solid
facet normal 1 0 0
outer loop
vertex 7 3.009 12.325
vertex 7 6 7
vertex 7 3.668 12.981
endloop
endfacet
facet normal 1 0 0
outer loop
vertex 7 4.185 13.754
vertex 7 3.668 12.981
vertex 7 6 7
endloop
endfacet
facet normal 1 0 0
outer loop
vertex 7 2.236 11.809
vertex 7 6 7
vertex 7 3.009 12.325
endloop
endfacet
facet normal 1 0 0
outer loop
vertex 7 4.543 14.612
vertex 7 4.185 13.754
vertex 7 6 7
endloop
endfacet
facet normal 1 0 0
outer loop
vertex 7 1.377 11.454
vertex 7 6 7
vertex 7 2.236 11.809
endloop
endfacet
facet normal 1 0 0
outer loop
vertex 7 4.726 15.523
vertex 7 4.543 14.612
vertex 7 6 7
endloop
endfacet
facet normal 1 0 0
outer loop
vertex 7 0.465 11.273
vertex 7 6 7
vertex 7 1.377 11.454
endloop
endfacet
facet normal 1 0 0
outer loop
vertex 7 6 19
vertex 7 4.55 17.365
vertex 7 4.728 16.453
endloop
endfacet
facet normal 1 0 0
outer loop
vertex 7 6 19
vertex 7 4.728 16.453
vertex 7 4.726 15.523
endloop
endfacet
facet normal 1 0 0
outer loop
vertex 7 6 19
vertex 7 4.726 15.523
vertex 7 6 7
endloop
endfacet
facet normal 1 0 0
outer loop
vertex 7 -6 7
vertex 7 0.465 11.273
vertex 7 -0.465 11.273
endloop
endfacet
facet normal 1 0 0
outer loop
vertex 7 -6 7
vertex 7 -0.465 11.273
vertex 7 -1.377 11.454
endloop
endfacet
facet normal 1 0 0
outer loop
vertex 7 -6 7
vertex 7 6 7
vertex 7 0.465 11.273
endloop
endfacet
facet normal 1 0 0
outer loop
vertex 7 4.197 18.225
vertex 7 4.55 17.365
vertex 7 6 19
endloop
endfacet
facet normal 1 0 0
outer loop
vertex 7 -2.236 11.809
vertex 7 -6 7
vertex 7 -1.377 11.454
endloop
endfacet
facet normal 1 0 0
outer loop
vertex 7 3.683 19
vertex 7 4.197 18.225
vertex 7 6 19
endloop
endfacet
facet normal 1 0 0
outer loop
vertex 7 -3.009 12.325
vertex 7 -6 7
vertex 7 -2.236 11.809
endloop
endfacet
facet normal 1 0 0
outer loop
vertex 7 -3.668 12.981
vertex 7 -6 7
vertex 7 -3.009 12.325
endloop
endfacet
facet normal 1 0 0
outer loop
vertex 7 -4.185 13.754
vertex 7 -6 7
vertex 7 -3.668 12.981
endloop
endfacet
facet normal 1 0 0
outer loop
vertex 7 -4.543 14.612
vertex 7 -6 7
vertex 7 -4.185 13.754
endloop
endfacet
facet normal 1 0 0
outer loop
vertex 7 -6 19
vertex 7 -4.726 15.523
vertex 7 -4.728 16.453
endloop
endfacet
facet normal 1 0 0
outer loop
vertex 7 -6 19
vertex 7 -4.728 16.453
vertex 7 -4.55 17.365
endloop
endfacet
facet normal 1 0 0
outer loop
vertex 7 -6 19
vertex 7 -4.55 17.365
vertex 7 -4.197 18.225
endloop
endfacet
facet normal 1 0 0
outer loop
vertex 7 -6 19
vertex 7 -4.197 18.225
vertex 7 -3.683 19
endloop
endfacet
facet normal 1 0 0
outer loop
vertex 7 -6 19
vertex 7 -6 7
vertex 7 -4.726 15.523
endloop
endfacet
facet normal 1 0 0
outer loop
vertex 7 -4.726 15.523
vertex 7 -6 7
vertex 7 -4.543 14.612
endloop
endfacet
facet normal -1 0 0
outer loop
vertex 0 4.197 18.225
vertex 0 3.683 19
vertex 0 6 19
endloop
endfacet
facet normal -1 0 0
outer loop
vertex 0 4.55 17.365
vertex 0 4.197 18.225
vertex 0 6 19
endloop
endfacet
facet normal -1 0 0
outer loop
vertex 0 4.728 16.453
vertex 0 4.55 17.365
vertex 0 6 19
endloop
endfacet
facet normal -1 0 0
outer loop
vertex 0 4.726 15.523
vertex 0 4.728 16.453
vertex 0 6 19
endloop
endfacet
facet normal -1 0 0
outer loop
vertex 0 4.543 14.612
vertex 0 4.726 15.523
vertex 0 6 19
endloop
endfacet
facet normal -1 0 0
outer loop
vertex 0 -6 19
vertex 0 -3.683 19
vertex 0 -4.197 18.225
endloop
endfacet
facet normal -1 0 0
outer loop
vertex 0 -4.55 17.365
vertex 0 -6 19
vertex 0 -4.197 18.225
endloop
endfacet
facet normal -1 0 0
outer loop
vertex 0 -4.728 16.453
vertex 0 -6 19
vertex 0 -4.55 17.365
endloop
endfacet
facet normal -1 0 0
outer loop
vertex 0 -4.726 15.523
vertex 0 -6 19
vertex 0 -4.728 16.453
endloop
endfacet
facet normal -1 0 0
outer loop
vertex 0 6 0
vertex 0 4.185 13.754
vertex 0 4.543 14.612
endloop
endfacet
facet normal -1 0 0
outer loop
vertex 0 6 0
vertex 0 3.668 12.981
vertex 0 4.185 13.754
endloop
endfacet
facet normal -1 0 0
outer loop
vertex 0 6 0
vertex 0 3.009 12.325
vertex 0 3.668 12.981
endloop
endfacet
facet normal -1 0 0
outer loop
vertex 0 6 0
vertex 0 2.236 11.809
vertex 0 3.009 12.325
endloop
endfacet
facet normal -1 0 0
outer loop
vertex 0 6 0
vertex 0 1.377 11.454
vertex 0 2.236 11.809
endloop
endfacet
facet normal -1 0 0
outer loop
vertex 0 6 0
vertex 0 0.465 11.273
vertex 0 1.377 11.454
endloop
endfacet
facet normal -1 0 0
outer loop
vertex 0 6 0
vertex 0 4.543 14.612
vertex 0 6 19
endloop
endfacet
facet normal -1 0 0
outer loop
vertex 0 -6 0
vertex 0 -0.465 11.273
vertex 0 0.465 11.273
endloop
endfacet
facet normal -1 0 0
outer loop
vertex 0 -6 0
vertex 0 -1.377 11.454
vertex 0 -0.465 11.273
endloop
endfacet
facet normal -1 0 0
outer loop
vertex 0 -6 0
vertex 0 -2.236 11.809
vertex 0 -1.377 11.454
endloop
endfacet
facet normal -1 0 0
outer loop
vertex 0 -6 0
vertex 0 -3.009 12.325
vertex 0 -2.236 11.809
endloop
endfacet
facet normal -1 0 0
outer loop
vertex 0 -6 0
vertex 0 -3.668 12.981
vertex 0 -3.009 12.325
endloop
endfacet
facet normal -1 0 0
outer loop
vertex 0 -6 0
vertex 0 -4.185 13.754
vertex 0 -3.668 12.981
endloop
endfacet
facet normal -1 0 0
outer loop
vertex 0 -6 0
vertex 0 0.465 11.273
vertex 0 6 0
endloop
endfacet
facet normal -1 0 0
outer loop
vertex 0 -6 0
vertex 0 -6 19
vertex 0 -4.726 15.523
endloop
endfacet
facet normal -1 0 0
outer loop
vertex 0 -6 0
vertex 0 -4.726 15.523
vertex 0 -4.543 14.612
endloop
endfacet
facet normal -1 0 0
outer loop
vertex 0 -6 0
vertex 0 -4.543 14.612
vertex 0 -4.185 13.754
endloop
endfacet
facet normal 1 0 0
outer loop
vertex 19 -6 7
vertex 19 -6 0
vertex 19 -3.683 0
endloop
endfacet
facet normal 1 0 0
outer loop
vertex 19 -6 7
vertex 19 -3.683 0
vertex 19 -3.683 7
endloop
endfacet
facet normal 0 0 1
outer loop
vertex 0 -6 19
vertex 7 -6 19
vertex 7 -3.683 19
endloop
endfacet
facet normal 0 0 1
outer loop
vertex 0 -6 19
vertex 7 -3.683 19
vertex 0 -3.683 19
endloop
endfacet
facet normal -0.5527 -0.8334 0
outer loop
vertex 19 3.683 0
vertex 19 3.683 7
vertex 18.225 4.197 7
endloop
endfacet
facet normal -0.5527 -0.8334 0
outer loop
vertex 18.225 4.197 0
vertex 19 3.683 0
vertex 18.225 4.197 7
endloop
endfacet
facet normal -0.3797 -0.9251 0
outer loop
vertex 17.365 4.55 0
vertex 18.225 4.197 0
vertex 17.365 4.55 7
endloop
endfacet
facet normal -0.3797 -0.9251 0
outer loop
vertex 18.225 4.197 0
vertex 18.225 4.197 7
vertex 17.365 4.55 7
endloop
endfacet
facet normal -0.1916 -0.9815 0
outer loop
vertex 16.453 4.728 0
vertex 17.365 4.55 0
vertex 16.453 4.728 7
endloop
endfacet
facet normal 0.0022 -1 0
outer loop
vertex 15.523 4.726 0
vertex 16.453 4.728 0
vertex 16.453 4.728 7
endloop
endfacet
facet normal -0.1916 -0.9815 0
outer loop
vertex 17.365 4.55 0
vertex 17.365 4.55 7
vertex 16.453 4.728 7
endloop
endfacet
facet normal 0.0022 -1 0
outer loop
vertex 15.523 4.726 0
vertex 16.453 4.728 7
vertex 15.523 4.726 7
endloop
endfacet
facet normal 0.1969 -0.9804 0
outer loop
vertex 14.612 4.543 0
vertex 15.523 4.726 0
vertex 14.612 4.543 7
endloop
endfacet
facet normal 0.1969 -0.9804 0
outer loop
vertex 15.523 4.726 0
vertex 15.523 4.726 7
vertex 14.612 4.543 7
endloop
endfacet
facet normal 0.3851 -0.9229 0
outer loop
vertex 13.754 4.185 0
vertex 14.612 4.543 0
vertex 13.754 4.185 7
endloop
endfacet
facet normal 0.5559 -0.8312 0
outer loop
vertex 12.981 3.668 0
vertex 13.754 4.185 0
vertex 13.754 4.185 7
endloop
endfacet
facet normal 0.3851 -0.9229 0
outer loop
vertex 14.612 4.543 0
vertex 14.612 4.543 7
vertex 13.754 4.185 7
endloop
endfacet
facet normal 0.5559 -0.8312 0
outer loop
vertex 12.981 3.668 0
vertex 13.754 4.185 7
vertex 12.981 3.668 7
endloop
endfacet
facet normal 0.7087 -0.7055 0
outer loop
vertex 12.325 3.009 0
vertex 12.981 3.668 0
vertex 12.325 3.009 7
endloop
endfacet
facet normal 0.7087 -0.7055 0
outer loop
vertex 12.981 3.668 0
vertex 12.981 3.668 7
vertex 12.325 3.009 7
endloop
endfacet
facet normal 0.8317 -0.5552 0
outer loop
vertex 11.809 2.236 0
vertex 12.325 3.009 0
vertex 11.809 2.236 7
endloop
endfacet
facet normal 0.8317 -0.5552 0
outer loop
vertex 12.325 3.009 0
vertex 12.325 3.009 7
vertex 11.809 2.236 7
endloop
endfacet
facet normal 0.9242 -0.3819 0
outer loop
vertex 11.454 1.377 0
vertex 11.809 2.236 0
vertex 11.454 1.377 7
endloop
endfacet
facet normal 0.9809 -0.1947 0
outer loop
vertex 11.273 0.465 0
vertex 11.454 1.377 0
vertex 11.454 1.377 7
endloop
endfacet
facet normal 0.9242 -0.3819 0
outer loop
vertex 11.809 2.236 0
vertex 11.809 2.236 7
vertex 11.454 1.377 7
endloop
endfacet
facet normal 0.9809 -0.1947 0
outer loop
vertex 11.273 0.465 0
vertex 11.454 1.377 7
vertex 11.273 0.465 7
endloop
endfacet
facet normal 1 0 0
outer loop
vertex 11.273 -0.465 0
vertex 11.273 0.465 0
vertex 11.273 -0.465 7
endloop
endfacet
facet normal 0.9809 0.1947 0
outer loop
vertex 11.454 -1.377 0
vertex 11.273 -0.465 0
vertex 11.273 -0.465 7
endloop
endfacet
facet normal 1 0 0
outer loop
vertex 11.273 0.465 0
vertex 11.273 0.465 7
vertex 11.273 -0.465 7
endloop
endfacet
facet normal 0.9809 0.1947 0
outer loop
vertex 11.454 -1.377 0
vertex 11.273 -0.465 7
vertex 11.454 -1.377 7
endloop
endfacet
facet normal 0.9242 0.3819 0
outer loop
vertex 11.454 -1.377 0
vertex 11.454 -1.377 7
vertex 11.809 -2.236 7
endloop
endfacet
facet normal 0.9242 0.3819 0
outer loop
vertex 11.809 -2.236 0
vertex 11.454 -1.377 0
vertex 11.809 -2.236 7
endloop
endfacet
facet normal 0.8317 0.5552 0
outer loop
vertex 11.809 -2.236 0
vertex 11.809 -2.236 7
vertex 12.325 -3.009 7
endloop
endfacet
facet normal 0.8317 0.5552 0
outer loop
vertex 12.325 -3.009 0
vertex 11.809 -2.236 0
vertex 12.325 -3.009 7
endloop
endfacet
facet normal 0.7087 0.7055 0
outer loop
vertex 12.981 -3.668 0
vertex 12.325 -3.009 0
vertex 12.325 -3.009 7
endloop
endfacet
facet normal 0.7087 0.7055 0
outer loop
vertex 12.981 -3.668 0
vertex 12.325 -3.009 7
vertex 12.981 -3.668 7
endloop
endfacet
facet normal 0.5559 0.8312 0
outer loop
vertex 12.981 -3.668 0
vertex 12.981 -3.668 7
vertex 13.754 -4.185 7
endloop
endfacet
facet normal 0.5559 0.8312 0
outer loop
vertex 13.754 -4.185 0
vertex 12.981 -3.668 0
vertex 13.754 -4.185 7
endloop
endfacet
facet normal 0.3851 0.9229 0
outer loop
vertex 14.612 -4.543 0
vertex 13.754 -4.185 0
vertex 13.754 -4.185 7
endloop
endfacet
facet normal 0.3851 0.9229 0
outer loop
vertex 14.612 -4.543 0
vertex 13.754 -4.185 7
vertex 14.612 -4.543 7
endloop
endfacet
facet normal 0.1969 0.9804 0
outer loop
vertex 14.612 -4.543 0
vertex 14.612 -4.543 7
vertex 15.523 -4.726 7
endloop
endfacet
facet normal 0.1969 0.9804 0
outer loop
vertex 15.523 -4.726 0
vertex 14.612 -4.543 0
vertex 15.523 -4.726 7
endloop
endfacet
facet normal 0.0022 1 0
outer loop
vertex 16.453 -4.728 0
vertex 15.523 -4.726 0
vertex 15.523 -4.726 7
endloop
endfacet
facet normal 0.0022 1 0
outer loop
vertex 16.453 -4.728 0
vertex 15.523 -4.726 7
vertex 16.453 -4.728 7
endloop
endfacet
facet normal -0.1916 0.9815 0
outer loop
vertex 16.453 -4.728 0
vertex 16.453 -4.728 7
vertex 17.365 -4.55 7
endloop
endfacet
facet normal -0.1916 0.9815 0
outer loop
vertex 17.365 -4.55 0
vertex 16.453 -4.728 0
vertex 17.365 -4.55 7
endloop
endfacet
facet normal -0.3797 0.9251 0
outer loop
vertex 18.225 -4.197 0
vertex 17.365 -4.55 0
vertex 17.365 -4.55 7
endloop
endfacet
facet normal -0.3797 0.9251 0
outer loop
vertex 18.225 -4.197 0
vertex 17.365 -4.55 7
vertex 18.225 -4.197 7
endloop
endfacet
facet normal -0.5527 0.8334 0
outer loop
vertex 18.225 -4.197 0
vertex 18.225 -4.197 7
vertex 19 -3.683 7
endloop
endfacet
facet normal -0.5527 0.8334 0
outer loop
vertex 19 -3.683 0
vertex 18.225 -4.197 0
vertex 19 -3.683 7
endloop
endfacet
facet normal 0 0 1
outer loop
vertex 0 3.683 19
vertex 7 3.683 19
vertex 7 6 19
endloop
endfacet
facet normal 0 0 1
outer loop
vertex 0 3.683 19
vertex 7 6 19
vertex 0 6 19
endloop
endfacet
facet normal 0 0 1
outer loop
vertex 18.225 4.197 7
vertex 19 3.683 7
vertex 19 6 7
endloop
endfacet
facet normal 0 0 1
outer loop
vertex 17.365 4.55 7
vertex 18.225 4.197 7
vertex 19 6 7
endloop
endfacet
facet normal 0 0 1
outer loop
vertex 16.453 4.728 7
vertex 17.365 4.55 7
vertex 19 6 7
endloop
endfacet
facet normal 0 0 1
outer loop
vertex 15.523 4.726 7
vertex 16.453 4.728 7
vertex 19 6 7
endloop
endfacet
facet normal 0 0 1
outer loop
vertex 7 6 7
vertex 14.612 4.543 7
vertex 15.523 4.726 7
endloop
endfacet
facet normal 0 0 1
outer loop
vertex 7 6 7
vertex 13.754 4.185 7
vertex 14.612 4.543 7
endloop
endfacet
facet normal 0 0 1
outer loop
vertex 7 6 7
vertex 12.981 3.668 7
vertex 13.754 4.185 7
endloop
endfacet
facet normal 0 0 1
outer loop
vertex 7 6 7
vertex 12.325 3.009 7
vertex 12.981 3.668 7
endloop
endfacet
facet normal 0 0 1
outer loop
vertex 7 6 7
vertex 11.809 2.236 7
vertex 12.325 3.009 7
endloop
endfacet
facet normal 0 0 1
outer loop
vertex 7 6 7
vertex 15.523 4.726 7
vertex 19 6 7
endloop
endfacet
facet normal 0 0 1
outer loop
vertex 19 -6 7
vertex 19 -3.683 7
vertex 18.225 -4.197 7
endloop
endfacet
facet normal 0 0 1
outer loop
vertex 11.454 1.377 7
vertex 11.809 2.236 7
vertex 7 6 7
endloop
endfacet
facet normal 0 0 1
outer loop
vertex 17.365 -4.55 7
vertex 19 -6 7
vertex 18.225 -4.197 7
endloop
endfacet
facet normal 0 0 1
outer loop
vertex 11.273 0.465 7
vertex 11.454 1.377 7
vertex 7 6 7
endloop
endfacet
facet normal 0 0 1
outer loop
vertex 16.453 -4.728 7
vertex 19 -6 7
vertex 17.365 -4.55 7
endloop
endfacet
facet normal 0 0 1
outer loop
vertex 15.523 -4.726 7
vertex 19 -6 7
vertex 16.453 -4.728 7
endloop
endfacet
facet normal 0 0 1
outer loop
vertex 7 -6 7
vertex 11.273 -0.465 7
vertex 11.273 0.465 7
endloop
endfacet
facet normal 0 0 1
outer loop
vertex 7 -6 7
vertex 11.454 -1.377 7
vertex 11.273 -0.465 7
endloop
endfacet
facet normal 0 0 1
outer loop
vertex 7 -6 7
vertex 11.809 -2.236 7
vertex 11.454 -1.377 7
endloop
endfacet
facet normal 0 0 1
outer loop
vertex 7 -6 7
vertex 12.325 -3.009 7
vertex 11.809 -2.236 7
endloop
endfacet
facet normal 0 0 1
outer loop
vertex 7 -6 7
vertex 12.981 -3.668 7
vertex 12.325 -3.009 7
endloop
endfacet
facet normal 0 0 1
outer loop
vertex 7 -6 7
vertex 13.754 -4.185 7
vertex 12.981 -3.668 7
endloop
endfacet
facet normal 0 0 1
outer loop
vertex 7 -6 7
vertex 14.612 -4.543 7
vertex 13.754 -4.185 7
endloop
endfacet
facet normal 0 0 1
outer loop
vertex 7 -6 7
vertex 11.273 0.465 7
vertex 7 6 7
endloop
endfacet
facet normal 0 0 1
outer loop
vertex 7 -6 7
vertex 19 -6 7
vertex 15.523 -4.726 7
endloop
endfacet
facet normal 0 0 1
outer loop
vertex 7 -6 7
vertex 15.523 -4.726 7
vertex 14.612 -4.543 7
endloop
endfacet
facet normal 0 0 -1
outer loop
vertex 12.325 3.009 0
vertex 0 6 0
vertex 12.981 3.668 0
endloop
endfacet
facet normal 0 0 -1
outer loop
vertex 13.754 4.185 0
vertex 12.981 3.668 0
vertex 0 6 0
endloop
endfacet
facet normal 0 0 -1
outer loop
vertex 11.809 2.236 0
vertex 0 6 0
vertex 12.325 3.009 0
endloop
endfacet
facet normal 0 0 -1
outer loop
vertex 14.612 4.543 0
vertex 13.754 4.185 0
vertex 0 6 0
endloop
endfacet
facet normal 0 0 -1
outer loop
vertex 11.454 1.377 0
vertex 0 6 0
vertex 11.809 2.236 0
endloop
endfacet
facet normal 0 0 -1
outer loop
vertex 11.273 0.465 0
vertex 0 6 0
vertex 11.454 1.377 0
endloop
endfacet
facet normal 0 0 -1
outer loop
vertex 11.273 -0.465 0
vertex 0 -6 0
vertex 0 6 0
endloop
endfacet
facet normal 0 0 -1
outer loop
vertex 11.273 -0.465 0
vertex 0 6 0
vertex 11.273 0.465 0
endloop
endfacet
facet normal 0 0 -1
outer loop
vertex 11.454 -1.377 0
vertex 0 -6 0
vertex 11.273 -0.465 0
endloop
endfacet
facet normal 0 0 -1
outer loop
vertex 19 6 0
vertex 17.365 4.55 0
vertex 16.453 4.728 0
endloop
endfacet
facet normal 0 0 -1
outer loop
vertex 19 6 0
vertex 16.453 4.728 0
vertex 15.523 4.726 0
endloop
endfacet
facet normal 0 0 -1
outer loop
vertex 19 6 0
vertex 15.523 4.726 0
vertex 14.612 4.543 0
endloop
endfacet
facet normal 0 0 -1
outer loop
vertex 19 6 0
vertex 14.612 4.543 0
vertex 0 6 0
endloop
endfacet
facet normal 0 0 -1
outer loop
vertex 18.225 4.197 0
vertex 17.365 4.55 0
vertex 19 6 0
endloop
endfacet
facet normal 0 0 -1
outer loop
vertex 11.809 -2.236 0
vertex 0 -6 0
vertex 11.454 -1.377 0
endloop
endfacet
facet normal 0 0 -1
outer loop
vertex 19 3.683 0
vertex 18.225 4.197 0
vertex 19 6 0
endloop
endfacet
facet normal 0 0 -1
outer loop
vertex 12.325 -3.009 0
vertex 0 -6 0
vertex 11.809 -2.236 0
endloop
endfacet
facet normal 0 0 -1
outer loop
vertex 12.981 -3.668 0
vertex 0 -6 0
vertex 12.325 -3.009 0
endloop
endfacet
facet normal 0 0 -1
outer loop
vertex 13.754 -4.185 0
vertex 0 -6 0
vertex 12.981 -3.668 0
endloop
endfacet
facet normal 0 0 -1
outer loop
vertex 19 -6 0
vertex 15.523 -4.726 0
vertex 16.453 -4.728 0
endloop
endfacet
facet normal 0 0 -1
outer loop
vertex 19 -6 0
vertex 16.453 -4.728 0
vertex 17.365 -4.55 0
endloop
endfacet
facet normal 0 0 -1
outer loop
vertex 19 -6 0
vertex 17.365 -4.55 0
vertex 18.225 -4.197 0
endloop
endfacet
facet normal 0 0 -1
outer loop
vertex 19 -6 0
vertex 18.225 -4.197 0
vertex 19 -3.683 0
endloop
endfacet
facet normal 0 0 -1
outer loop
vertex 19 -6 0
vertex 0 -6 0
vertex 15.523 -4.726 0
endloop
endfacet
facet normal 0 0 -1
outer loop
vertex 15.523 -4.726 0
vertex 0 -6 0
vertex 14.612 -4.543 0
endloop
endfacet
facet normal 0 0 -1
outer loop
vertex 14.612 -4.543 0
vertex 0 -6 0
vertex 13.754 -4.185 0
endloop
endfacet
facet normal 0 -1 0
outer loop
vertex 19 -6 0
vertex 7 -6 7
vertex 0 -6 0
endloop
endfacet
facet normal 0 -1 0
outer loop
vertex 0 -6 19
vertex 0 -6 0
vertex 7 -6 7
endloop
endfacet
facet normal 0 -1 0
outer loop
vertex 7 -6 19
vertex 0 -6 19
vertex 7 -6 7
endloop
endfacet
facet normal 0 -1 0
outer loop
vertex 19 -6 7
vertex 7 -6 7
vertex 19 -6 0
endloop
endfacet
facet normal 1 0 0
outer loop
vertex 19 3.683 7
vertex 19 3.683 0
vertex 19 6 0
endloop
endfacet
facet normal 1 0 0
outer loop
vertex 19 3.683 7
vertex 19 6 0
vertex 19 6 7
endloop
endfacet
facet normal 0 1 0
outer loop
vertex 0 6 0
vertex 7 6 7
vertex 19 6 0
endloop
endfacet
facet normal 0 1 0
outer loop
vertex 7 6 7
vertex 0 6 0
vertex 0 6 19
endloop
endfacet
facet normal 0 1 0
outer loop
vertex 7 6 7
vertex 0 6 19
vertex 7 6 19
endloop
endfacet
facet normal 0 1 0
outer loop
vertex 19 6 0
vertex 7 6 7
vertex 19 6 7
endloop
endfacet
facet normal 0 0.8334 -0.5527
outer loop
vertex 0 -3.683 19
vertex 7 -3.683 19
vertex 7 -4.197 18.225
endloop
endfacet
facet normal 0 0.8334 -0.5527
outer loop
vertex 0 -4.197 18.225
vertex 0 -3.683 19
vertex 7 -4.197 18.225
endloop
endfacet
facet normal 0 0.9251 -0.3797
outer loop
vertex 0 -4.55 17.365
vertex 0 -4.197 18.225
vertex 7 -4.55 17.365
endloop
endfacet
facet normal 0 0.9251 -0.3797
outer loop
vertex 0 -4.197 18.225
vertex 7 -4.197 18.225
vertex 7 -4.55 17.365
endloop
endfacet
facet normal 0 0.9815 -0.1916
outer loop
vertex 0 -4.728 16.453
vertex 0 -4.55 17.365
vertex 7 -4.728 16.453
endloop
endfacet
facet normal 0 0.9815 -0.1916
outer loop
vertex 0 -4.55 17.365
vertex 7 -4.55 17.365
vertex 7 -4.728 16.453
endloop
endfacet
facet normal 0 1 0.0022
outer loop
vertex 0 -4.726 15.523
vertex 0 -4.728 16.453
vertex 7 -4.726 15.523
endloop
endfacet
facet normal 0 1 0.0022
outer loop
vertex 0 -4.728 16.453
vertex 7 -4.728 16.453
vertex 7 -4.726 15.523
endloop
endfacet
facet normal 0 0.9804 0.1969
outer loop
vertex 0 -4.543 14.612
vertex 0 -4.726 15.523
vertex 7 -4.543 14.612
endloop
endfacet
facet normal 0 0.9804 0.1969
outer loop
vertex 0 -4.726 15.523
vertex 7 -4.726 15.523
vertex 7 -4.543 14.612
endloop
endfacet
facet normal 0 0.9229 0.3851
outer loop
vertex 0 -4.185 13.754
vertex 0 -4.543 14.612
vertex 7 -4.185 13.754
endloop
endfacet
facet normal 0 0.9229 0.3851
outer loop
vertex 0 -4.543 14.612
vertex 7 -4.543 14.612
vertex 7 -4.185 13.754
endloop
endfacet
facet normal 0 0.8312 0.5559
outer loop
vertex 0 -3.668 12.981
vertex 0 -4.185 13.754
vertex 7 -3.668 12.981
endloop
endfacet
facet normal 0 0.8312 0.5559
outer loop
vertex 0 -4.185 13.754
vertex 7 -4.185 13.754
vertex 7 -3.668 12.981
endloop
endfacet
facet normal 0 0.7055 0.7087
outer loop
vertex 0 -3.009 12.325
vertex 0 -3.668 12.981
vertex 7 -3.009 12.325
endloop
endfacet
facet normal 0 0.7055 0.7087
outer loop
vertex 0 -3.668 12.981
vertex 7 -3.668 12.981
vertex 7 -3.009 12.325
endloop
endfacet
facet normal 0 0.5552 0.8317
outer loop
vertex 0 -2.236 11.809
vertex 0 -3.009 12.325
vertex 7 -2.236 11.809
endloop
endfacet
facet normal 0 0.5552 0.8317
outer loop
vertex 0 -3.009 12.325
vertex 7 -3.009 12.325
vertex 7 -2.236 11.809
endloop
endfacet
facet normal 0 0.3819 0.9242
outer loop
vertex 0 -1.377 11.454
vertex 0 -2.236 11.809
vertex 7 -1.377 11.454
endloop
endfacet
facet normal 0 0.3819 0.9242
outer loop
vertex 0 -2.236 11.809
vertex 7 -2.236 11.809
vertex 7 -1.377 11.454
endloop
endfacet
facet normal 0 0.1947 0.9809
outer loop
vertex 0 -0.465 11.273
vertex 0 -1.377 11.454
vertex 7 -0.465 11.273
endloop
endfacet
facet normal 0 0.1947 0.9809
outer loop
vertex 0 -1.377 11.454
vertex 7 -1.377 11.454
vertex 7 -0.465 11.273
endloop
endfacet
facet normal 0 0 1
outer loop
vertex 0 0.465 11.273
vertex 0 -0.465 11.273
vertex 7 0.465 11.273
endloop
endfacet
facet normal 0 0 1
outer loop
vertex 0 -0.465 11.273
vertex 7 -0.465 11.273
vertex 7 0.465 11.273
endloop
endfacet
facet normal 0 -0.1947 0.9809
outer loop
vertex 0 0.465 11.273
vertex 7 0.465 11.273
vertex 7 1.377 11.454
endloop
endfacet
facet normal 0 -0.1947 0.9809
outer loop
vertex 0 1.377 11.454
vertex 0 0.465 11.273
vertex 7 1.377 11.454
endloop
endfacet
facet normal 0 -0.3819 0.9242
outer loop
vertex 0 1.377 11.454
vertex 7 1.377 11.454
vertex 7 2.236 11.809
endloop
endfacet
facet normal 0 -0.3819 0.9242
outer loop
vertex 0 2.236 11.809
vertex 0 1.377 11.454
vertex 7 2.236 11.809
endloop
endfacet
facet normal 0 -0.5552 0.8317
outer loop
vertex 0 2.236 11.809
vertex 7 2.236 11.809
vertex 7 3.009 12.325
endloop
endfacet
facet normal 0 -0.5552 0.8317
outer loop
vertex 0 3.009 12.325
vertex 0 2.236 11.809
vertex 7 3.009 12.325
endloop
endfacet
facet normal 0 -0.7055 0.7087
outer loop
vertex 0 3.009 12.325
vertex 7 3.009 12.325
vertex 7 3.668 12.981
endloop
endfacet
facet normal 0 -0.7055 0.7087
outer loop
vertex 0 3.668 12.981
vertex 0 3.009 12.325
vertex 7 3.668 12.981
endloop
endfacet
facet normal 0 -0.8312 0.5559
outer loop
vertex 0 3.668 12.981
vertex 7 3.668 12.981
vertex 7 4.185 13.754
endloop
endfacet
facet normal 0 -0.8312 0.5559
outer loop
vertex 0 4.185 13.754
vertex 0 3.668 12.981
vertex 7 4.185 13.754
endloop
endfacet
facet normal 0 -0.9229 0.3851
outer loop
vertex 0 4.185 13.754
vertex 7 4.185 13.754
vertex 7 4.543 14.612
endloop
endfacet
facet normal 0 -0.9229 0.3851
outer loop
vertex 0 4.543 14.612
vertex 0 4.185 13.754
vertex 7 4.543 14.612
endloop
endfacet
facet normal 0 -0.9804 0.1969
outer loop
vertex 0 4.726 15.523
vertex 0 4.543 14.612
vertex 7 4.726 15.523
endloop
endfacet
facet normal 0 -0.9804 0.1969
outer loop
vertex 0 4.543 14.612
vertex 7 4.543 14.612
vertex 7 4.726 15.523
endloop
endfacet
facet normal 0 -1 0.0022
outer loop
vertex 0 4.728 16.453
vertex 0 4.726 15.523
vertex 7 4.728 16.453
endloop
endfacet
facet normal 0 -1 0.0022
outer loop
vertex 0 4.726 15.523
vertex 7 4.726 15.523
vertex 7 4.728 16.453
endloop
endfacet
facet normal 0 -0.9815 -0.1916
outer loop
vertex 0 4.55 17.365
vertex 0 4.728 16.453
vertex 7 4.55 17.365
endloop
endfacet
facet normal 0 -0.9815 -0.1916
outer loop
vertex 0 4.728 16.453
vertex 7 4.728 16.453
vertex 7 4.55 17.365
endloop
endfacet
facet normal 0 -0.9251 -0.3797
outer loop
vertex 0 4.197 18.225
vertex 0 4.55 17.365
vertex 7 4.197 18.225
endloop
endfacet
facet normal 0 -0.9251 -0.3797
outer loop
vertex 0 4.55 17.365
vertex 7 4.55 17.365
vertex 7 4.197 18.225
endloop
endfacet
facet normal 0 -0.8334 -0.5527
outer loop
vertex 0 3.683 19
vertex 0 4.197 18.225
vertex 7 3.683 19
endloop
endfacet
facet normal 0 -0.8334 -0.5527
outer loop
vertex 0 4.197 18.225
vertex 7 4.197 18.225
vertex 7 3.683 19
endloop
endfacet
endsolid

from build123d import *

# Parameters (mm, degrees)
F1_DEPTH = 6
F3_DEPTH = 7.001
F4_R     = 4.75
F5_DEPTH = 25


with BuildPart() as f1:
    # F0 (on Front) → F1 (new body, symmetric)
    with BuildSketch(Plane.XZ):
        Polygon((7, 19), (0, 19), (0, 0), (19, 0), (19, 7), (7, 7), align=None)
    extrude(amount=F1_DEPTH, both=True)

    # F2 (on face) → F3 (cut, through all)
    with BuildSketch(Plane.XY.offset(7)):
        with BuildLine():
            ThreePointArc((19, -3.68273), (20.290251, -2.038688), (20.75, 0))
            ThreePointArc((20.75, 0), (20.290251, 2.038688), (19, 3.68273))
            Line((19, 3.68273), (19, -3.68273))
        make_face()
        with BuildLine():
            Line((19, -3.68273), (19, 3.68273))
            ThreePointArc((19, 3.68273), (11.25, 0), (19, -3.68273))
        make_face()
    extrude(amount=-F3_DEPTH, mode=Mode.SUBTRACT)

    # F4 (on face) → F5 (cut)
    with BuildSketch(Plane.YZ.offset(7)):
        with Locations((0, 16)):
            Circle(F4_R)
    extrude(amount=-F5_DEPTH, mode=Mode.SUBTRACT)


solid = f1.part
